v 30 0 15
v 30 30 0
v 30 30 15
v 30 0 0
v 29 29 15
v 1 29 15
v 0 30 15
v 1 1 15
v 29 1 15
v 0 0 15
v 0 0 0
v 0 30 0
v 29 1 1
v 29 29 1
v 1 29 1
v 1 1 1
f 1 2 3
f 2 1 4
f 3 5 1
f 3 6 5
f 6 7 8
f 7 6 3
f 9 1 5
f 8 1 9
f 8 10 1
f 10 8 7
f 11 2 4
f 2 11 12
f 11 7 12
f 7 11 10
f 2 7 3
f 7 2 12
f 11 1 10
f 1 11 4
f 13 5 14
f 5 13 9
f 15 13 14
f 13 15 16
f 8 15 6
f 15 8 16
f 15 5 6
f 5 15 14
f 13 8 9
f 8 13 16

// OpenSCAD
length=30;
height=15;
width=30;
proportion=2.5;
t=1;
bottomthickness=1;

difference(){
    cube([width,length,height]);
    
    translate([1,1,bottomthickness])
    cube([width-t*2,length-t*2,height*2]);
}    
